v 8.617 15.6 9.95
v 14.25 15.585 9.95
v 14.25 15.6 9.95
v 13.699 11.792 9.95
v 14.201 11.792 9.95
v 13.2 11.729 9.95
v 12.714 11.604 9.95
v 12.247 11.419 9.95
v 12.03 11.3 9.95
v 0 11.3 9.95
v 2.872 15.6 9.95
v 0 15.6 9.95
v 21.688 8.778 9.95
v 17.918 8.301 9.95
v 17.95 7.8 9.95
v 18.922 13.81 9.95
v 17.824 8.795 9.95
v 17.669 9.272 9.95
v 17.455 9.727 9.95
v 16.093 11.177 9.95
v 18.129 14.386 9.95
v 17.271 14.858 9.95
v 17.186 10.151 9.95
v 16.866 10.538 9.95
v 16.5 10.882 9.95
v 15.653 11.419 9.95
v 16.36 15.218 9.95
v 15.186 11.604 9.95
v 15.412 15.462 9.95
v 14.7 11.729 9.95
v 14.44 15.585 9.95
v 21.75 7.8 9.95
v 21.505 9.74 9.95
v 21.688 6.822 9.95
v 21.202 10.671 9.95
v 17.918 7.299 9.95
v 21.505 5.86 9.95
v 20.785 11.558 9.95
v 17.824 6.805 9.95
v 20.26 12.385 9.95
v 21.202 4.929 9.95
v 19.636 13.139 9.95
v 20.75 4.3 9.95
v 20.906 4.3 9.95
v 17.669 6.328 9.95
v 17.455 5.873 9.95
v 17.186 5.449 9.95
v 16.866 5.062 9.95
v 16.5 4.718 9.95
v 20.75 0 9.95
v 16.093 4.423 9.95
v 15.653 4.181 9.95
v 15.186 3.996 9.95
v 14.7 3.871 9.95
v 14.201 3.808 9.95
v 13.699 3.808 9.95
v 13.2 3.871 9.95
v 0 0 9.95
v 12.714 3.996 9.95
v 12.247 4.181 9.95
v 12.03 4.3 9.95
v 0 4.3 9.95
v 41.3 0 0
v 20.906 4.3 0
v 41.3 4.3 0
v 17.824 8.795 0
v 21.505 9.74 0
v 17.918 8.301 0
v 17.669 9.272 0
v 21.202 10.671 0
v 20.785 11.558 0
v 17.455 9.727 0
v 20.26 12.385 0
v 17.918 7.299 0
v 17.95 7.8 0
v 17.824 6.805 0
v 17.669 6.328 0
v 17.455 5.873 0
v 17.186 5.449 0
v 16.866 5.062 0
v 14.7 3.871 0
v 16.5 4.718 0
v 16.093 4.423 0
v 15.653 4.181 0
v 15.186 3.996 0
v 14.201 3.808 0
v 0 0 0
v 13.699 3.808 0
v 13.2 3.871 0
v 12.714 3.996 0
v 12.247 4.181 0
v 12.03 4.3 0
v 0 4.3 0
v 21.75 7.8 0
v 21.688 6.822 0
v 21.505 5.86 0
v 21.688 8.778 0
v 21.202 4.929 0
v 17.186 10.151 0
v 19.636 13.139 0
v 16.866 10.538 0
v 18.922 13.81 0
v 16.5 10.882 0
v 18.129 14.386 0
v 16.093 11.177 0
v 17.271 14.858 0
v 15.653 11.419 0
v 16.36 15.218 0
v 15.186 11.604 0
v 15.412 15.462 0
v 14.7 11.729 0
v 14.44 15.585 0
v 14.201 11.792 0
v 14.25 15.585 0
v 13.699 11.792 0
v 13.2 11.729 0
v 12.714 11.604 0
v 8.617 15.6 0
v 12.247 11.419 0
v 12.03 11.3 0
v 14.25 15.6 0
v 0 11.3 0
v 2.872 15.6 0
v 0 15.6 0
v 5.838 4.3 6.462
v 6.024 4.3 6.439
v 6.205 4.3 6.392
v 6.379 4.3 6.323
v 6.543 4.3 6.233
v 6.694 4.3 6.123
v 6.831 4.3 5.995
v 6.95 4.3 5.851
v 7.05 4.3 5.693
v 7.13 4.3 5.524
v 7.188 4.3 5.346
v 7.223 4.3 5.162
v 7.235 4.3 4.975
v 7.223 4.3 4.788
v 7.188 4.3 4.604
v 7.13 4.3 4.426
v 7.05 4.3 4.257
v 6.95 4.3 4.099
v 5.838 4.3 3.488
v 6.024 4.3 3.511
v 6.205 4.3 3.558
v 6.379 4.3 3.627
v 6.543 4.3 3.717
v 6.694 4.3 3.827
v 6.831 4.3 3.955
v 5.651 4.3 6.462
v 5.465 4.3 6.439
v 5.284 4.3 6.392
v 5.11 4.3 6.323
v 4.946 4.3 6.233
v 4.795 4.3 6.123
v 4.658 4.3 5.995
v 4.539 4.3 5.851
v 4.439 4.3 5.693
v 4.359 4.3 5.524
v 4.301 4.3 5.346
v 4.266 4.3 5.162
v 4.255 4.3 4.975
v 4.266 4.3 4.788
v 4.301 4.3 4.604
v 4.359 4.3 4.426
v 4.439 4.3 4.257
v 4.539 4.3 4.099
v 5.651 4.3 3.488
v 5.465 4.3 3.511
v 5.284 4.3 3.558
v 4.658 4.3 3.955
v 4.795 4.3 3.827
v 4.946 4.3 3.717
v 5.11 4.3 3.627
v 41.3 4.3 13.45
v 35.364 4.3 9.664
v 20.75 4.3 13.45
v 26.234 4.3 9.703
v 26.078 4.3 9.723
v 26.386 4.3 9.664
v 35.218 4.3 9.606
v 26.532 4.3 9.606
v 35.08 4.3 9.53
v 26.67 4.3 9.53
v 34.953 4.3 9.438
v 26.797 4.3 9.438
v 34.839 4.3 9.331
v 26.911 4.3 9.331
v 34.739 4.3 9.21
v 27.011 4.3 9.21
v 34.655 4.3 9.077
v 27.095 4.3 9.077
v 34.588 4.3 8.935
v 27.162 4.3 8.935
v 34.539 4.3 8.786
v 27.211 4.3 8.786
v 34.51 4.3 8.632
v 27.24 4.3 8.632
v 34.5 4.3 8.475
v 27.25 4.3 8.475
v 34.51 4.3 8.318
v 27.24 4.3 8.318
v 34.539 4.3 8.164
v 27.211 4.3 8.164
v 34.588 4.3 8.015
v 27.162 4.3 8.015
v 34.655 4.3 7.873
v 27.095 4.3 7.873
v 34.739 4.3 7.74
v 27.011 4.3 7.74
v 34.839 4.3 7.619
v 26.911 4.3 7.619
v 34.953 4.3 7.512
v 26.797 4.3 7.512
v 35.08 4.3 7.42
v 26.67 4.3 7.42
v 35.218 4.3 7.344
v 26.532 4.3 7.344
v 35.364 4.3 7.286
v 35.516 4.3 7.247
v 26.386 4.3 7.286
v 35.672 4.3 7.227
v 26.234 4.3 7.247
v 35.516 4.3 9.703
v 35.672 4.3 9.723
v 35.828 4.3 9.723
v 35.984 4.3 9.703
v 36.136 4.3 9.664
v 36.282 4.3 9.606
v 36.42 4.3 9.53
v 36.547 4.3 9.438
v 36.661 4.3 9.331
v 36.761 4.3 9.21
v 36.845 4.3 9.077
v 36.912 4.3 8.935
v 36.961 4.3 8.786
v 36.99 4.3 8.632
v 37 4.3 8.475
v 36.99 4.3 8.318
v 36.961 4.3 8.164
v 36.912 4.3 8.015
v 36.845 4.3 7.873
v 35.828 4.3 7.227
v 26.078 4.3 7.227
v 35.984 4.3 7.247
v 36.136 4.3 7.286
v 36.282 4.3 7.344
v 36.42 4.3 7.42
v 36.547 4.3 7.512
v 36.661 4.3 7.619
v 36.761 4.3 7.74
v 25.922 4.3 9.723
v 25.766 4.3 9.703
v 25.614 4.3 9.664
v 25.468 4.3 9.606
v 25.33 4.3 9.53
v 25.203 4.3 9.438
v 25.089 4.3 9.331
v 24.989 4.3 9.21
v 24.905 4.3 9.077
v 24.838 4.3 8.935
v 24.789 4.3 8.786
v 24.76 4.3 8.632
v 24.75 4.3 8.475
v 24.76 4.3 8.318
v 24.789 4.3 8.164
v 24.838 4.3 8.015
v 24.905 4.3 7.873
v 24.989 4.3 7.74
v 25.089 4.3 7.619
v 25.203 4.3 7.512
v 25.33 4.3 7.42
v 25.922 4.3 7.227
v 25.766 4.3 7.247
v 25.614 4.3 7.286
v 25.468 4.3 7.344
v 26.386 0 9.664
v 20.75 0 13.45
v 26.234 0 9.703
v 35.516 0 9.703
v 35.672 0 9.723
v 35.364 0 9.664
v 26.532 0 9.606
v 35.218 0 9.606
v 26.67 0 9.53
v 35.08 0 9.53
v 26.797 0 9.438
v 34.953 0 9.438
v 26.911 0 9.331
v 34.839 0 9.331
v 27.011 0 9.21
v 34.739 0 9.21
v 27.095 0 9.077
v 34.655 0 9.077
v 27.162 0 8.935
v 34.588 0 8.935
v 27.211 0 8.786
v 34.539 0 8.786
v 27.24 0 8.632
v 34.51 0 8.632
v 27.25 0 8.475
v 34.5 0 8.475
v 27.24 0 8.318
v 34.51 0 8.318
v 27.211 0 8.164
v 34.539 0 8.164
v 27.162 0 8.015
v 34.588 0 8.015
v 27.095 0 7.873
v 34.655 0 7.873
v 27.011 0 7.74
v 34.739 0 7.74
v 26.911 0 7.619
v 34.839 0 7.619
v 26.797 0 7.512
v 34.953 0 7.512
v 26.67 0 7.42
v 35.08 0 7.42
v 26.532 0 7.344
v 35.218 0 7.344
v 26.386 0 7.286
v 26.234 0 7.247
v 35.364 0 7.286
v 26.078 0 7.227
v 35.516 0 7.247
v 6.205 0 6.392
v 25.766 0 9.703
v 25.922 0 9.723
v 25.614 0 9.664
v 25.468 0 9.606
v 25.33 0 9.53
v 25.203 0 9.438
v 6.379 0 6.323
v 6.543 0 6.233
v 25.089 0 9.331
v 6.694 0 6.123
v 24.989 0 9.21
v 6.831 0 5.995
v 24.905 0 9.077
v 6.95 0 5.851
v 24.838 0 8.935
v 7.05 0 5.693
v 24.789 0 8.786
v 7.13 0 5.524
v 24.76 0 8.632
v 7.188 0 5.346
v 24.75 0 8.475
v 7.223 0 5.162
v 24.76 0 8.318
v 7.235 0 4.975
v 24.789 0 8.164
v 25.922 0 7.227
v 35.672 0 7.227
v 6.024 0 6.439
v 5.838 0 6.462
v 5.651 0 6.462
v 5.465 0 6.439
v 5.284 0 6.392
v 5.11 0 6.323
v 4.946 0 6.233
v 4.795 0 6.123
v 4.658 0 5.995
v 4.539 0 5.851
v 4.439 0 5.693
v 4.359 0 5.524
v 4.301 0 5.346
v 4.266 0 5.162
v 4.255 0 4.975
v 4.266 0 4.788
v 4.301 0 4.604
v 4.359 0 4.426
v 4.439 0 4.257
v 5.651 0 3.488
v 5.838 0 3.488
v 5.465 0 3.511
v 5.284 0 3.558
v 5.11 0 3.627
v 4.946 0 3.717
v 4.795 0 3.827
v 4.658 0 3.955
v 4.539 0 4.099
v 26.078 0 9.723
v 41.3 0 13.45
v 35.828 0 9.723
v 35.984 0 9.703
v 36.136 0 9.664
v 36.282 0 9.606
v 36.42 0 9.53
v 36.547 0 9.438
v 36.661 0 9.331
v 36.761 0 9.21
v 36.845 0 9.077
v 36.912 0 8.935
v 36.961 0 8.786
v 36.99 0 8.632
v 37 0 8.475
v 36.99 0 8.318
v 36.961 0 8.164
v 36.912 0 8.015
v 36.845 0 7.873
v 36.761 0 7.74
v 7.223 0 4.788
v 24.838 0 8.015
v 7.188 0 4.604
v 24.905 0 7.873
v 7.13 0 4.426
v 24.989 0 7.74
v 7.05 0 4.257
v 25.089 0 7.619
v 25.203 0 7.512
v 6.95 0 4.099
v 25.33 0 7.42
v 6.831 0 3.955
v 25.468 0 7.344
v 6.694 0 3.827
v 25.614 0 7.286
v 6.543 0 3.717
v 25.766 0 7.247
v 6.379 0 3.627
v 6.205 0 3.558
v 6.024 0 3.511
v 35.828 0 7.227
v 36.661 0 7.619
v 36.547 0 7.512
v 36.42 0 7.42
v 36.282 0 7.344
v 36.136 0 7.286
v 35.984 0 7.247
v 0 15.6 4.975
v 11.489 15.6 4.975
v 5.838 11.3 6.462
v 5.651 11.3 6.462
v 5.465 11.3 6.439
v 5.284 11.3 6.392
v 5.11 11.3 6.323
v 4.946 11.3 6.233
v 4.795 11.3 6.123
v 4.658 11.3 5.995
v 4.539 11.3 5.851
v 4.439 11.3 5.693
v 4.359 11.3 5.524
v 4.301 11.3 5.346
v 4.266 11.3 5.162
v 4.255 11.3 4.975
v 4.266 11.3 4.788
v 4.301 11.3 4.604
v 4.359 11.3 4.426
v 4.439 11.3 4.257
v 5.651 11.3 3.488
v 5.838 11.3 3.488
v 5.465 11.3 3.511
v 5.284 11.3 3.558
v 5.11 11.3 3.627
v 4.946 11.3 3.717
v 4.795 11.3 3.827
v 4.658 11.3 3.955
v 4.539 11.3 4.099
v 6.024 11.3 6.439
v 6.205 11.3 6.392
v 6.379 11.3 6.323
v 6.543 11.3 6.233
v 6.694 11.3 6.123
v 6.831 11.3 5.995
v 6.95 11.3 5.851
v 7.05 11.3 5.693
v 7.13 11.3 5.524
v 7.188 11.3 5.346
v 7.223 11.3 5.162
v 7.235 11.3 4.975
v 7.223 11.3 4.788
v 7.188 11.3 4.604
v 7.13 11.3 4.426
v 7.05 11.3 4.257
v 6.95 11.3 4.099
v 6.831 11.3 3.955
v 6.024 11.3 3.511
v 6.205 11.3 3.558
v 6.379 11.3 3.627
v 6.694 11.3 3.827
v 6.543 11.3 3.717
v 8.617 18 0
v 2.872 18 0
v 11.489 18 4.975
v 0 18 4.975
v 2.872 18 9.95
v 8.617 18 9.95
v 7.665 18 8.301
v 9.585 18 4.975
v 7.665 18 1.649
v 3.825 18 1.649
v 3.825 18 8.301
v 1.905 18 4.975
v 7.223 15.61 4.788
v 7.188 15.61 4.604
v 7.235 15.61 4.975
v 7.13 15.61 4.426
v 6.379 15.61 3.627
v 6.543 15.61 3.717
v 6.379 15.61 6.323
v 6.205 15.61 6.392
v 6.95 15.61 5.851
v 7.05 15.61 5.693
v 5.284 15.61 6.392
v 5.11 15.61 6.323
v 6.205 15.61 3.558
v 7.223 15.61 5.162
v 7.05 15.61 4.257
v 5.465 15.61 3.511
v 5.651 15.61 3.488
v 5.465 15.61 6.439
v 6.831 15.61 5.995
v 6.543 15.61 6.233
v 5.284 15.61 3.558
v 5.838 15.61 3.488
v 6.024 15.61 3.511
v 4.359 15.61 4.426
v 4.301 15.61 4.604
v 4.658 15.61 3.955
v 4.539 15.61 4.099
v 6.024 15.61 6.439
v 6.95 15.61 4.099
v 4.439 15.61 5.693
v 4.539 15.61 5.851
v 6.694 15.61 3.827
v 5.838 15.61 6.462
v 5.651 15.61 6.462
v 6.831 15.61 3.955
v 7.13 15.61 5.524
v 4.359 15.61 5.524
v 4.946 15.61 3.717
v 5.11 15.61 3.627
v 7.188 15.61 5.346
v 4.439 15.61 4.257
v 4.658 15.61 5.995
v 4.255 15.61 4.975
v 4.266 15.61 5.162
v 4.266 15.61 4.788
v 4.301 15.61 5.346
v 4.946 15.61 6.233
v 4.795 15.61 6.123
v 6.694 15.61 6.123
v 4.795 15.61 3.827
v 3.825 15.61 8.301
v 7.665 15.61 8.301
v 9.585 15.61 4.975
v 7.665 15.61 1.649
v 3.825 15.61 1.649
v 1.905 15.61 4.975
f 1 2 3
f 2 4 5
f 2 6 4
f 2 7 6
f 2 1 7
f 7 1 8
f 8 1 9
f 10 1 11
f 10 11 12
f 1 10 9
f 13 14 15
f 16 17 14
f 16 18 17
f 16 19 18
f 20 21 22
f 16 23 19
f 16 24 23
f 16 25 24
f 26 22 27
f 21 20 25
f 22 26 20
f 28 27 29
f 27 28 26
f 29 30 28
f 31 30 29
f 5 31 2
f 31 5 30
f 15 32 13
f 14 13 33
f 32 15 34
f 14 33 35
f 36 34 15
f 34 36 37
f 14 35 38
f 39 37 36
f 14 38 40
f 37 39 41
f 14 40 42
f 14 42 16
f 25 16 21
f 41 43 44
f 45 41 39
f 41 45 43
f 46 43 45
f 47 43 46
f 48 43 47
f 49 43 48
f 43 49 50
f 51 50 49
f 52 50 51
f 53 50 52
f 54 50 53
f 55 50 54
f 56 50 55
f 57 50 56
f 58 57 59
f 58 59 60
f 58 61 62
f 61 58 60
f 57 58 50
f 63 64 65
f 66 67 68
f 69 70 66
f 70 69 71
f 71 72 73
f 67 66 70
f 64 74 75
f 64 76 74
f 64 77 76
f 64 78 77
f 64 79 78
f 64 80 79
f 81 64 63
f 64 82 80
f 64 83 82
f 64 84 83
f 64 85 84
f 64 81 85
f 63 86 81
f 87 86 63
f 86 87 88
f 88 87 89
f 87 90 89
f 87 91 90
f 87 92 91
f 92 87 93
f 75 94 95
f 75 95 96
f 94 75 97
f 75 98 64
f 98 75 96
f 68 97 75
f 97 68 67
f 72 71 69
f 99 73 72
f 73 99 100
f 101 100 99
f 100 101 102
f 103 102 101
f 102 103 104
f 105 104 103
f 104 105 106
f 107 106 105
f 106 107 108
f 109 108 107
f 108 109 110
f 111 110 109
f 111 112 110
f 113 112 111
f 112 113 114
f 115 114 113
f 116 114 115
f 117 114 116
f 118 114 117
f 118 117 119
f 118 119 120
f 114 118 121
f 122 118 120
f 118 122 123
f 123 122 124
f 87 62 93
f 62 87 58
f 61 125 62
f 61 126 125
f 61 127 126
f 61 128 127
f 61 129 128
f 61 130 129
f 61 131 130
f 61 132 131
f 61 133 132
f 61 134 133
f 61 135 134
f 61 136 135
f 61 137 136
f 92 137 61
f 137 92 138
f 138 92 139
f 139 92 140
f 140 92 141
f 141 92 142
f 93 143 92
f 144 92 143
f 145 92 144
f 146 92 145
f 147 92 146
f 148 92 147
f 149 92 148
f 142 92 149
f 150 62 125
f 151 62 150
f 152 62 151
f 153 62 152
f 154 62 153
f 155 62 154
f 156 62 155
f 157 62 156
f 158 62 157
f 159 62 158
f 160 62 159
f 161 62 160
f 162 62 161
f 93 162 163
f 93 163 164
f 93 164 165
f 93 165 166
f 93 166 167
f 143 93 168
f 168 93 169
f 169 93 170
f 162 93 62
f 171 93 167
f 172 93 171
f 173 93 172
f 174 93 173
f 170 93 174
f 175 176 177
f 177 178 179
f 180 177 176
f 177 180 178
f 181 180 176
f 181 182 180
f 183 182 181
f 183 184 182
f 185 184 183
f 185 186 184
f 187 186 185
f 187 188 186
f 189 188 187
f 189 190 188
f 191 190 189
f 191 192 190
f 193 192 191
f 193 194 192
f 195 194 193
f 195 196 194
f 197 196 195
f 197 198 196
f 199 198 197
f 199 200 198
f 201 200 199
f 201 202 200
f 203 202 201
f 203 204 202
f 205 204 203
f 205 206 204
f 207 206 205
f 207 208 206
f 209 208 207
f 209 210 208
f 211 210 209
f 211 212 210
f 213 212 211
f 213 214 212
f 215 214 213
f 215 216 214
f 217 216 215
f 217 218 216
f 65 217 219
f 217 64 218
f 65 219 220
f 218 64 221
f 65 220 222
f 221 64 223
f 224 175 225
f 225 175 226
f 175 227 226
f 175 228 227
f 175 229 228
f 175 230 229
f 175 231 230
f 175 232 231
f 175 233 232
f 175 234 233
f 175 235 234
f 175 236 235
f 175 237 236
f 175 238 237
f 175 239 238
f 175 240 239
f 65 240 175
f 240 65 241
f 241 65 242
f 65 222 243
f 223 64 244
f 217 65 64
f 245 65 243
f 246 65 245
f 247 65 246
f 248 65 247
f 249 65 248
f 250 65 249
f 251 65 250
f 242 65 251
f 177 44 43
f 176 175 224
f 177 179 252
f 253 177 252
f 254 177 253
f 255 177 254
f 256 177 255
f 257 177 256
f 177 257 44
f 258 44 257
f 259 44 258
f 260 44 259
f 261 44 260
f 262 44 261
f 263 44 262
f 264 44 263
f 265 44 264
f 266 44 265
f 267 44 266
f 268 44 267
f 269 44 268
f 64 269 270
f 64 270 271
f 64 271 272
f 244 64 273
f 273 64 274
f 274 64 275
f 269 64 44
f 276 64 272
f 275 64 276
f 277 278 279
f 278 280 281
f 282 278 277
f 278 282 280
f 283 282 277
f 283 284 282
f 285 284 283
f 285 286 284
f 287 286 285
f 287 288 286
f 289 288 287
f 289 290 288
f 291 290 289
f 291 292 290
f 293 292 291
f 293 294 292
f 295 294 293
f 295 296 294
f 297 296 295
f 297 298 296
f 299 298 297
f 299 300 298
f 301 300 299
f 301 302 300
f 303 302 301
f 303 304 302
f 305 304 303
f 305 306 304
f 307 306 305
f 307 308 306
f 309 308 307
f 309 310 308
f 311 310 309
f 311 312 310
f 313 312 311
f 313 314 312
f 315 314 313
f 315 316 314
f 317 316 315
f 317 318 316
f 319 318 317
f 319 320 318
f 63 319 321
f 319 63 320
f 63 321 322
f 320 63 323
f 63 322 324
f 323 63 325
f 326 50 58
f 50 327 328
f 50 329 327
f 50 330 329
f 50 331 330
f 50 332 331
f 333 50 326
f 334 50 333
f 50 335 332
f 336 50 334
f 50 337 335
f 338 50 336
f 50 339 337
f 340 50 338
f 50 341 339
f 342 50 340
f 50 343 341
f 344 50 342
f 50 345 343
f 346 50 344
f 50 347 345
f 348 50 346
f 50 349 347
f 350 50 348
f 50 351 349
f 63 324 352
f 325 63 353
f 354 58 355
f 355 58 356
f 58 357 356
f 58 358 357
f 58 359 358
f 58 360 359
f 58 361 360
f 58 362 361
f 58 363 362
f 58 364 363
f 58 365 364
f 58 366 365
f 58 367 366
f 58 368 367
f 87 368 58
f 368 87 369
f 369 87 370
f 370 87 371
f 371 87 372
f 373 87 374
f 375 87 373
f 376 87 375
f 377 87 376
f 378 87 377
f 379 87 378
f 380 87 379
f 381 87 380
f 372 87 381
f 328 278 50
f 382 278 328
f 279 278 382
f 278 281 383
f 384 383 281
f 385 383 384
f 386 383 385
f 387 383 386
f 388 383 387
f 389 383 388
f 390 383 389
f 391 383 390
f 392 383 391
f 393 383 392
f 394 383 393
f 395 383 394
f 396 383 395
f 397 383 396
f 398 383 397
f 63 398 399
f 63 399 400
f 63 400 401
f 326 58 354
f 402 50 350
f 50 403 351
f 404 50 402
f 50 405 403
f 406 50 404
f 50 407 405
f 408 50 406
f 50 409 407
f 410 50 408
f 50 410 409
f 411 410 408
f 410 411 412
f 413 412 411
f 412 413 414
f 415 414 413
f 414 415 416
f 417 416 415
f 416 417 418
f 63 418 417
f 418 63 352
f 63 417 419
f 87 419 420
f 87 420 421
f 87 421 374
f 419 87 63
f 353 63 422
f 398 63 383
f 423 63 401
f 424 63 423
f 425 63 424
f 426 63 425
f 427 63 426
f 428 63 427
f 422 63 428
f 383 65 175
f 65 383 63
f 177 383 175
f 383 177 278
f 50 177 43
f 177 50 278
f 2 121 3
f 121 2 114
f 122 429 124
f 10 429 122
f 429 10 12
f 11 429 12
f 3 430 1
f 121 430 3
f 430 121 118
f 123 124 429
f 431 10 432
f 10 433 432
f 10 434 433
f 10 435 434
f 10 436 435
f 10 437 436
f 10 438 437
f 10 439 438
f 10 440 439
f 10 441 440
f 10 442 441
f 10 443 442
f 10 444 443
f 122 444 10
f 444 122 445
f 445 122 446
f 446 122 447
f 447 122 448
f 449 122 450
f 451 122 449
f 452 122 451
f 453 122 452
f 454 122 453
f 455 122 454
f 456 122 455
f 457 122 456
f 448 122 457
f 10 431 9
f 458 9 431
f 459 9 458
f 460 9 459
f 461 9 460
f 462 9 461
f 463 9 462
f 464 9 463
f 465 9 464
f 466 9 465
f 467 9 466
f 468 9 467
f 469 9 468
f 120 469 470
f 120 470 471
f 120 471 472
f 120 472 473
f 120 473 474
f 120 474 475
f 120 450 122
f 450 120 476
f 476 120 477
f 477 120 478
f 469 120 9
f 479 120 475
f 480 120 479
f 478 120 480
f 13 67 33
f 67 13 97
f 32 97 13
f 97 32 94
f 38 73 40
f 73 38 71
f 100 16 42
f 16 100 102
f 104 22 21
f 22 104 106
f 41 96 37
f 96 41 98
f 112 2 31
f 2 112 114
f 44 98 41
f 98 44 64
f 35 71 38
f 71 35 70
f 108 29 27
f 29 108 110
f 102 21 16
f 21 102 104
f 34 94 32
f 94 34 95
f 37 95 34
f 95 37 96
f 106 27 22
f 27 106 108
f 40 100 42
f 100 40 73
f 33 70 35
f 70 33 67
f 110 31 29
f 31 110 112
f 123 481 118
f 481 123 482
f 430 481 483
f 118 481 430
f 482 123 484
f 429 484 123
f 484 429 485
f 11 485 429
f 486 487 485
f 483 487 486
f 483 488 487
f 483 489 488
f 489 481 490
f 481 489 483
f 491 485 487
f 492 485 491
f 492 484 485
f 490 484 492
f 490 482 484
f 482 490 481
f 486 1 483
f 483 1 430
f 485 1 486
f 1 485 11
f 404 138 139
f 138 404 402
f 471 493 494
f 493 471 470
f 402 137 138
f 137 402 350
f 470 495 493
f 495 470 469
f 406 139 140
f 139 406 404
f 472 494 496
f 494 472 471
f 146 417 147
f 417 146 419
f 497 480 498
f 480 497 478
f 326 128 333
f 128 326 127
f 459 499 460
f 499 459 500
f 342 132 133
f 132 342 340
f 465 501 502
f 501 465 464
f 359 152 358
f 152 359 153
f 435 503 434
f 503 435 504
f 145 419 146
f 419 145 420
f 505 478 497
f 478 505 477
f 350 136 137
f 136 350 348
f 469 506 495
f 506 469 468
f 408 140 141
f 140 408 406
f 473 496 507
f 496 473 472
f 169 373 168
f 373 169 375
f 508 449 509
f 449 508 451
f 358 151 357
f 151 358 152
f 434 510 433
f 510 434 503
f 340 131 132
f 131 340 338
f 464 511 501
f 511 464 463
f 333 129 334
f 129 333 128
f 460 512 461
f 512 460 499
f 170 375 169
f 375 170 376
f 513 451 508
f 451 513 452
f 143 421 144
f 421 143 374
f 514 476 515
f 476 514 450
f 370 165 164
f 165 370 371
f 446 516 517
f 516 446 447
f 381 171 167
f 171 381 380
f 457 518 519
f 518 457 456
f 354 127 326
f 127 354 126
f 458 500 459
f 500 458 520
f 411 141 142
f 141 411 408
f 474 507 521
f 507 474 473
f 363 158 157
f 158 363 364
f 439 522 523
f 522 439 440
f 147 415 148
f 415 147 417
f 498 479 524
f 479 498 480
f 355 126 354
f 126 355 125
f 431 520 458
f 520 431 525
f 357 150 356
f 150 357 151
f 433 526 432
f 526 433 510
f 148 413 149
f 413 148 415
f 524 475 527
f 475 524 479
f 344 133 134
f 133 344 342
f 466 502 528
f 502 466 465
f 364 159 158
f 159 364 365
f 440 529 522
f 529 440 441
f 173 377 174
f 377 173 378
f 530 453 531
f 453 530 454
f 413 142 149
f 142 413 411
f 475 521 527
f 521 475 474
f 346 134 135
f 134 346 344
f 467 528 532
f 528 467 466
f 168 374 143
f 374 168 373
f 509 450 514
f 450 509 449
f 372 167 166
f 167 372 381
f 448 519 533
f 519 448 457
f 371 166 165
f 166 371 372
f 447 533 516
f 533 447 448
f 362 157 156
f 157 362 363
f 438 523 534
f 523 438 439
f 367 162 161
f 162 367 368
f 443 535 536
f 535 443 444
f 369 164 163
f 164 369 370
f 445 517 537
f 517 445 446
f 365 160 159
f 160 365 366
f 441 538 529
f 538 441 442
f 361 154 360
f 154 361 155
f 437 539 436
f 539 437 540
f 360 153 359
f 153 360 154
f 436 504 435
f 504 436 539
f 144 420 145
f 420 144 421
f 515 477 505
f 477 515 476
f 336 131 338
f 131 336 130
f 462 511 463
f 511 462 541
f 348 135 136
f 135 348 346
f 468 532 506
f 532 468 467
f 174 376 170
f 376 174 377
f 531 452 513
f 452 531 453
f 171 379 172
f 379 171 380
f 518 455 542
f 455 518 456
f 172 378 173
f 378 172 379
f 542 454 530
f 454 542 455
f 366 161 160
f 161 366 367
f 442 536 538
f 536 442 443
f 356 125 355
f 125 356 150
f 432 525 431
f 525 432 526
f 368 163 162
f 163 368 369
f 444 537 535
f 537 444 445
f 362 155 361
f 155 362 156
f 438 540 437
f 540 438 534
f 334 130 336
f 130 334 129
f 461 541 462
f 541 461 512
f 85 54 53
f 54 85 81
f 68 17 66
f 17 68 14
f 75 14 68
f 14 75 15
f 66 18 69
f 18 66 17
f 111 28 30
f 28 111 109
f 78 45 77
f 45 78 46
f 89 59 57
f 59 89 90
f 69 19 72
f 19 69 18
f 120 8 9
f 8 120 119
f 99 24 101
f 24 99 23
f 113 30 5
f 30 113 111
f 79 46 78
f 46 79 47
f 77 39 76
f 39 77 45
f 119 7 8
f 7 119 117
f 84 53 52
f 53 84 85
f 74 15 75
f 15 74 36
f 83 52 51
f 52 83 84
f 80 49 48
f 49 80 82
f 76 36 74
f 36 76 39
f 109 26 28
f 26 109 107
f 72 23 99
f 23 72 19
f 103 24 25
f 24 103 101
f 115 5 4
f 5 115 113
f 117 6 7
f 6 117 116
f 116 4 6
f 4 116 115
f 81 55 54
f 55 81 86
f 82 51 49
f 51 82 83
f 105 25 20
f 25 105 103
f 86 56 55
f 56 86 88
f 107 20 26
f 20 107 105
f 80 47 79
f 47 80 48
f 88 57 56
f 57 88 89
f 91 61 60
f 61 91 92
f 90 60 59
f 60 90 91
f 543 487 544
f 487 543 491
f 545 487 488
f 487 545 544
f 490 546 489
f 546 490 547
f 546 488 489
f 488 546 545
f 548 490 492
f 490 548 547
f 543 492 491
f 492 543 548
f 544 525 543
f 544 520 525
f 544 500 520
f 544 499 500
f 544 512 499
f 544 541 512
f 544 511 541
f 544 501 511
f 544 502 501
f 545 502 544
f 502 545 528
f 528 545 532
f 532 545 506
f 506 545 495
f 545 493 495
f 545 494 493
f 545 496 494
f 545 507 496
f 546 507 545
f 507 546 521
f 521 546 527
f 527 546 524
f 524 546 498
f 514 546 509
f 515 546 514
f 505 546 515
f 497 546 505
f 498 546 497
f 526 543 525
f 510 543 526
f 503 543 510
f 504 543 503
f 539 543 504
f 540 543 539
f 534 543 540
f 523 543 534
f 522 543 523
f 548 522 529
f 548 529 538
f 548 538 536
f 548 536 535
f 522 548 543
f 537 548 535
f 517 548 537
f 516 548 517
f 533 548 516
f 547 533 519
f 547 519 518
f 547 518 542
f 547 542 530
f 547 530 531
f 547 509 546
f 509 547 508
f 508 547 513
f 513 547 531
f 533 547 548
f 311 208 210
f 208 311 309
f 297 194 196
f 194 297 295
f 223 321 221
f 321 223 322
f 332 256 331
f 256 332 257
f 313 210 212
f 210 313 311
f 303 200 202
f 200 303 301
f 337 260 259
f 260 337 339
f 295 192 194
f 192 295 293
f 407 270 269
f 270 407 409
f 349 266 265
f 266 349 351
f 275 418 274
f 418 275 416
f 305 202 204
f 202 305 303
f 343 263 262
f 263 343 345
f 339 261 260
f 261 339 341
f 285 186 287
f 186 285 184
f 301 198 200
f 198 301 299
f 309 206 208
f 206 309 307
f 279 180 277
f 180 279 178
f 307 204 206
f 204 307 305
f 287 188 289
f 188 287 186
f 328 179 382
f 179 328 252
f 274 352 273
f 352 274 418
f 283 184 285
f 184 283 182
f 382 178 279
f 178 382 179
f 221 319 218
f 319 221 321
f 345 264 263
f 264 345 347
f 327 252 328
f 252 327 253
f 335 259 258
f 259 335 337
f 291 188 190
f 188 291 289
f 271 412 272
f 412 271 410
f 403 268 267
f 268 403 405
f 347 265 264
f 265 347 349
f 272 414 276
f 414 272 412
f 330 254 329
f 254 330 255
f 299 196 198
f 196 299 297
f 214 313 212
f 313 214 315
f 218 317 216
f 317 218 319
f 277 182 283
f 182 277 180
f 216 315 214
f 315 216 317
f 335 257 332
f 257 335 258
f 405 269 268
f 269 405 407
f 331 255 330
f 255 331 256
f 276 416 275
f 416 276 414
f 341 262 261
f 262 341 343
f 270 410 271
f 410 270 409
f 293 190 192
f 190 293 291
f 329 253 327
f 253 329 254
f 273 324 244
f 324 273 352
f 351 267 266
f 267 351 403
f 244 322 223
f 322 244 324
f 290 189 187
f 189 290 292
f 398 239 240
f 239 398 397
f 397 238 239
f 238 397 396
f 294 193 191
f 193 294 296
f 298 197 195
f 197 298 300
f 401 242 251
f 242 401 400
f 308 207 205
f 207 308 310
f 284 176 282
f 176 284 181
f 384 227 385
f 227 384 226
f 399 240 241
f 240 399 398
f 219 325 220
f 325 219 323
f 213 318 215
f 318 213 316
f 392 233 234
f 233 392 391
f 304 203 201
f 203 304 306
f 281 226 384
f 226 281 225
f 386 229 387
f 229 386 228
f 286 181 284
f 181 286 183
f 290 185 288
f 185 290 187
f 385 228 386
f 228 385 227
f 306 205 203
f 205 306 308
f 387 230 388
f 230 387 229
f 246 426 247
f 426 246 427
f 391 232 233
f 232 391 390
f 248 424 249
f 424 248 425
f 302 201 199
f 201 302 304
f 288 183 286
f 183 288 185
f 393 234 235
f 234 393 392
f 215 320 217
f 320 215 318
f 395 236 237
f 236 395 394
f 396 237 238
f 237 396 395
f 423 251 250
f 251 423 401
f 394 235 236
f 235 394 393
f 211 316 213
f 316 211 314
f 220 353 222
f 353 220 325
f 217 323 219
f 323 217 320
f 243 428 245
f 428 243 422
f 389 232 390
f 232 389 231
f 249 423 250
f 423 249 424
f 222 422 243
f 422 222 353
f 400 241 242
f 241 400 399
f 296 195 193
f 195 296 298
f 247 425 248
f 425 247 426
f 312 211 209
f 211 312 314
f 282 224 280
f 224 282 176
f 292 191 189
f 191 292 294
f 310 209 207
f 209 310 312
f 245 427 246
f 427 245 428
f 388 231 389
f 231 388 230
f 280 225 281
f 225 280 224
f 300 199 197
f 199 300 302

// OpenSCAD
// Prusa i3 endstop holder with offset.
//
// The endstop holder from 3dprinterczar.com is designed to clamp onto the
// M8 rod, and hold the microswitch in place with a zip tie. However, the switch
// protrudes from the holder, which reduces the range of motion for the Y axis,
// and makes it much harder to place the Z axis endstop without impacting the
// coupler on that axis.
//
// This part simply offsets the microswitch to reduce the amount by which it
// protrudes from the holder.

include <MCAD/nuts_and_bolts.scad>

$fn=50;
eps=0.01;
wall=4.3;
z=9.95;
z_offset=3.5;
rod=4;
slip = 0.5;
nut_x = METRIC_NUT_AC_WIDTHS[3];
nut_y = METRIC_NUT_THICKNESS[3];
nut_z = sqrt(3) * nut_x / 2;
nut_scale = z/nut_z;
difference() {
  union() {
    cube([40.75, wall, z]);
    translate([z+2*rod+wall-3*slip,0, 0])
      cube([40.75-nut_x-2*rod-wall-3*slip, wall, z+z_offset]);
    translate([0,wall + 2*rod - 2*slip, 0])
      cube([z+wall, wall, z]);
    translate([z+rod, wall + rod - slip, 0])
      cylinder(r=rod+wall-slip, h=z);
  translate([nut_scale*nut_x/2,2*(wall+rod-slip),z/2])
    rotate([-90,0,0])
      scale([nut_scale,nut_scale,1])
        nutHole(3);
  }
  translate([z+rod, wall + rod - slip, -eps])
    cylinder(r=rod, h=z+2*eps);
  translate([0, wall, -eps])
    cube([z+rod, 2*rod - 2*slip, z+2*eps]);
  translate([nut_scale*nut_x/2,2*(wall+rod-slip)+eps,z/2])
    rotate([-90,0,0])
      scale([1.2,1.2,1])
        nutHole(3);
  translate([nut_scale*nut_x/2,-eps,z/2])
    rotate([-90,0,0])
      //#cylinder(r=3/2,h=2*(wall+rod+eps));
      boltHole(3, length=2*(wall+rod-slip)+3*eps);
  translate([26, -eps, z_offset+z/2])
    rotate([-90,0,0])
      cylinder(r=1.25,h=wall+2*eps);
  translate([35.75, -eps, z_offset+z/2])
    rotate([-90,0,0])
      cylinder(r=1.25,h=wall+2*eps);
}
